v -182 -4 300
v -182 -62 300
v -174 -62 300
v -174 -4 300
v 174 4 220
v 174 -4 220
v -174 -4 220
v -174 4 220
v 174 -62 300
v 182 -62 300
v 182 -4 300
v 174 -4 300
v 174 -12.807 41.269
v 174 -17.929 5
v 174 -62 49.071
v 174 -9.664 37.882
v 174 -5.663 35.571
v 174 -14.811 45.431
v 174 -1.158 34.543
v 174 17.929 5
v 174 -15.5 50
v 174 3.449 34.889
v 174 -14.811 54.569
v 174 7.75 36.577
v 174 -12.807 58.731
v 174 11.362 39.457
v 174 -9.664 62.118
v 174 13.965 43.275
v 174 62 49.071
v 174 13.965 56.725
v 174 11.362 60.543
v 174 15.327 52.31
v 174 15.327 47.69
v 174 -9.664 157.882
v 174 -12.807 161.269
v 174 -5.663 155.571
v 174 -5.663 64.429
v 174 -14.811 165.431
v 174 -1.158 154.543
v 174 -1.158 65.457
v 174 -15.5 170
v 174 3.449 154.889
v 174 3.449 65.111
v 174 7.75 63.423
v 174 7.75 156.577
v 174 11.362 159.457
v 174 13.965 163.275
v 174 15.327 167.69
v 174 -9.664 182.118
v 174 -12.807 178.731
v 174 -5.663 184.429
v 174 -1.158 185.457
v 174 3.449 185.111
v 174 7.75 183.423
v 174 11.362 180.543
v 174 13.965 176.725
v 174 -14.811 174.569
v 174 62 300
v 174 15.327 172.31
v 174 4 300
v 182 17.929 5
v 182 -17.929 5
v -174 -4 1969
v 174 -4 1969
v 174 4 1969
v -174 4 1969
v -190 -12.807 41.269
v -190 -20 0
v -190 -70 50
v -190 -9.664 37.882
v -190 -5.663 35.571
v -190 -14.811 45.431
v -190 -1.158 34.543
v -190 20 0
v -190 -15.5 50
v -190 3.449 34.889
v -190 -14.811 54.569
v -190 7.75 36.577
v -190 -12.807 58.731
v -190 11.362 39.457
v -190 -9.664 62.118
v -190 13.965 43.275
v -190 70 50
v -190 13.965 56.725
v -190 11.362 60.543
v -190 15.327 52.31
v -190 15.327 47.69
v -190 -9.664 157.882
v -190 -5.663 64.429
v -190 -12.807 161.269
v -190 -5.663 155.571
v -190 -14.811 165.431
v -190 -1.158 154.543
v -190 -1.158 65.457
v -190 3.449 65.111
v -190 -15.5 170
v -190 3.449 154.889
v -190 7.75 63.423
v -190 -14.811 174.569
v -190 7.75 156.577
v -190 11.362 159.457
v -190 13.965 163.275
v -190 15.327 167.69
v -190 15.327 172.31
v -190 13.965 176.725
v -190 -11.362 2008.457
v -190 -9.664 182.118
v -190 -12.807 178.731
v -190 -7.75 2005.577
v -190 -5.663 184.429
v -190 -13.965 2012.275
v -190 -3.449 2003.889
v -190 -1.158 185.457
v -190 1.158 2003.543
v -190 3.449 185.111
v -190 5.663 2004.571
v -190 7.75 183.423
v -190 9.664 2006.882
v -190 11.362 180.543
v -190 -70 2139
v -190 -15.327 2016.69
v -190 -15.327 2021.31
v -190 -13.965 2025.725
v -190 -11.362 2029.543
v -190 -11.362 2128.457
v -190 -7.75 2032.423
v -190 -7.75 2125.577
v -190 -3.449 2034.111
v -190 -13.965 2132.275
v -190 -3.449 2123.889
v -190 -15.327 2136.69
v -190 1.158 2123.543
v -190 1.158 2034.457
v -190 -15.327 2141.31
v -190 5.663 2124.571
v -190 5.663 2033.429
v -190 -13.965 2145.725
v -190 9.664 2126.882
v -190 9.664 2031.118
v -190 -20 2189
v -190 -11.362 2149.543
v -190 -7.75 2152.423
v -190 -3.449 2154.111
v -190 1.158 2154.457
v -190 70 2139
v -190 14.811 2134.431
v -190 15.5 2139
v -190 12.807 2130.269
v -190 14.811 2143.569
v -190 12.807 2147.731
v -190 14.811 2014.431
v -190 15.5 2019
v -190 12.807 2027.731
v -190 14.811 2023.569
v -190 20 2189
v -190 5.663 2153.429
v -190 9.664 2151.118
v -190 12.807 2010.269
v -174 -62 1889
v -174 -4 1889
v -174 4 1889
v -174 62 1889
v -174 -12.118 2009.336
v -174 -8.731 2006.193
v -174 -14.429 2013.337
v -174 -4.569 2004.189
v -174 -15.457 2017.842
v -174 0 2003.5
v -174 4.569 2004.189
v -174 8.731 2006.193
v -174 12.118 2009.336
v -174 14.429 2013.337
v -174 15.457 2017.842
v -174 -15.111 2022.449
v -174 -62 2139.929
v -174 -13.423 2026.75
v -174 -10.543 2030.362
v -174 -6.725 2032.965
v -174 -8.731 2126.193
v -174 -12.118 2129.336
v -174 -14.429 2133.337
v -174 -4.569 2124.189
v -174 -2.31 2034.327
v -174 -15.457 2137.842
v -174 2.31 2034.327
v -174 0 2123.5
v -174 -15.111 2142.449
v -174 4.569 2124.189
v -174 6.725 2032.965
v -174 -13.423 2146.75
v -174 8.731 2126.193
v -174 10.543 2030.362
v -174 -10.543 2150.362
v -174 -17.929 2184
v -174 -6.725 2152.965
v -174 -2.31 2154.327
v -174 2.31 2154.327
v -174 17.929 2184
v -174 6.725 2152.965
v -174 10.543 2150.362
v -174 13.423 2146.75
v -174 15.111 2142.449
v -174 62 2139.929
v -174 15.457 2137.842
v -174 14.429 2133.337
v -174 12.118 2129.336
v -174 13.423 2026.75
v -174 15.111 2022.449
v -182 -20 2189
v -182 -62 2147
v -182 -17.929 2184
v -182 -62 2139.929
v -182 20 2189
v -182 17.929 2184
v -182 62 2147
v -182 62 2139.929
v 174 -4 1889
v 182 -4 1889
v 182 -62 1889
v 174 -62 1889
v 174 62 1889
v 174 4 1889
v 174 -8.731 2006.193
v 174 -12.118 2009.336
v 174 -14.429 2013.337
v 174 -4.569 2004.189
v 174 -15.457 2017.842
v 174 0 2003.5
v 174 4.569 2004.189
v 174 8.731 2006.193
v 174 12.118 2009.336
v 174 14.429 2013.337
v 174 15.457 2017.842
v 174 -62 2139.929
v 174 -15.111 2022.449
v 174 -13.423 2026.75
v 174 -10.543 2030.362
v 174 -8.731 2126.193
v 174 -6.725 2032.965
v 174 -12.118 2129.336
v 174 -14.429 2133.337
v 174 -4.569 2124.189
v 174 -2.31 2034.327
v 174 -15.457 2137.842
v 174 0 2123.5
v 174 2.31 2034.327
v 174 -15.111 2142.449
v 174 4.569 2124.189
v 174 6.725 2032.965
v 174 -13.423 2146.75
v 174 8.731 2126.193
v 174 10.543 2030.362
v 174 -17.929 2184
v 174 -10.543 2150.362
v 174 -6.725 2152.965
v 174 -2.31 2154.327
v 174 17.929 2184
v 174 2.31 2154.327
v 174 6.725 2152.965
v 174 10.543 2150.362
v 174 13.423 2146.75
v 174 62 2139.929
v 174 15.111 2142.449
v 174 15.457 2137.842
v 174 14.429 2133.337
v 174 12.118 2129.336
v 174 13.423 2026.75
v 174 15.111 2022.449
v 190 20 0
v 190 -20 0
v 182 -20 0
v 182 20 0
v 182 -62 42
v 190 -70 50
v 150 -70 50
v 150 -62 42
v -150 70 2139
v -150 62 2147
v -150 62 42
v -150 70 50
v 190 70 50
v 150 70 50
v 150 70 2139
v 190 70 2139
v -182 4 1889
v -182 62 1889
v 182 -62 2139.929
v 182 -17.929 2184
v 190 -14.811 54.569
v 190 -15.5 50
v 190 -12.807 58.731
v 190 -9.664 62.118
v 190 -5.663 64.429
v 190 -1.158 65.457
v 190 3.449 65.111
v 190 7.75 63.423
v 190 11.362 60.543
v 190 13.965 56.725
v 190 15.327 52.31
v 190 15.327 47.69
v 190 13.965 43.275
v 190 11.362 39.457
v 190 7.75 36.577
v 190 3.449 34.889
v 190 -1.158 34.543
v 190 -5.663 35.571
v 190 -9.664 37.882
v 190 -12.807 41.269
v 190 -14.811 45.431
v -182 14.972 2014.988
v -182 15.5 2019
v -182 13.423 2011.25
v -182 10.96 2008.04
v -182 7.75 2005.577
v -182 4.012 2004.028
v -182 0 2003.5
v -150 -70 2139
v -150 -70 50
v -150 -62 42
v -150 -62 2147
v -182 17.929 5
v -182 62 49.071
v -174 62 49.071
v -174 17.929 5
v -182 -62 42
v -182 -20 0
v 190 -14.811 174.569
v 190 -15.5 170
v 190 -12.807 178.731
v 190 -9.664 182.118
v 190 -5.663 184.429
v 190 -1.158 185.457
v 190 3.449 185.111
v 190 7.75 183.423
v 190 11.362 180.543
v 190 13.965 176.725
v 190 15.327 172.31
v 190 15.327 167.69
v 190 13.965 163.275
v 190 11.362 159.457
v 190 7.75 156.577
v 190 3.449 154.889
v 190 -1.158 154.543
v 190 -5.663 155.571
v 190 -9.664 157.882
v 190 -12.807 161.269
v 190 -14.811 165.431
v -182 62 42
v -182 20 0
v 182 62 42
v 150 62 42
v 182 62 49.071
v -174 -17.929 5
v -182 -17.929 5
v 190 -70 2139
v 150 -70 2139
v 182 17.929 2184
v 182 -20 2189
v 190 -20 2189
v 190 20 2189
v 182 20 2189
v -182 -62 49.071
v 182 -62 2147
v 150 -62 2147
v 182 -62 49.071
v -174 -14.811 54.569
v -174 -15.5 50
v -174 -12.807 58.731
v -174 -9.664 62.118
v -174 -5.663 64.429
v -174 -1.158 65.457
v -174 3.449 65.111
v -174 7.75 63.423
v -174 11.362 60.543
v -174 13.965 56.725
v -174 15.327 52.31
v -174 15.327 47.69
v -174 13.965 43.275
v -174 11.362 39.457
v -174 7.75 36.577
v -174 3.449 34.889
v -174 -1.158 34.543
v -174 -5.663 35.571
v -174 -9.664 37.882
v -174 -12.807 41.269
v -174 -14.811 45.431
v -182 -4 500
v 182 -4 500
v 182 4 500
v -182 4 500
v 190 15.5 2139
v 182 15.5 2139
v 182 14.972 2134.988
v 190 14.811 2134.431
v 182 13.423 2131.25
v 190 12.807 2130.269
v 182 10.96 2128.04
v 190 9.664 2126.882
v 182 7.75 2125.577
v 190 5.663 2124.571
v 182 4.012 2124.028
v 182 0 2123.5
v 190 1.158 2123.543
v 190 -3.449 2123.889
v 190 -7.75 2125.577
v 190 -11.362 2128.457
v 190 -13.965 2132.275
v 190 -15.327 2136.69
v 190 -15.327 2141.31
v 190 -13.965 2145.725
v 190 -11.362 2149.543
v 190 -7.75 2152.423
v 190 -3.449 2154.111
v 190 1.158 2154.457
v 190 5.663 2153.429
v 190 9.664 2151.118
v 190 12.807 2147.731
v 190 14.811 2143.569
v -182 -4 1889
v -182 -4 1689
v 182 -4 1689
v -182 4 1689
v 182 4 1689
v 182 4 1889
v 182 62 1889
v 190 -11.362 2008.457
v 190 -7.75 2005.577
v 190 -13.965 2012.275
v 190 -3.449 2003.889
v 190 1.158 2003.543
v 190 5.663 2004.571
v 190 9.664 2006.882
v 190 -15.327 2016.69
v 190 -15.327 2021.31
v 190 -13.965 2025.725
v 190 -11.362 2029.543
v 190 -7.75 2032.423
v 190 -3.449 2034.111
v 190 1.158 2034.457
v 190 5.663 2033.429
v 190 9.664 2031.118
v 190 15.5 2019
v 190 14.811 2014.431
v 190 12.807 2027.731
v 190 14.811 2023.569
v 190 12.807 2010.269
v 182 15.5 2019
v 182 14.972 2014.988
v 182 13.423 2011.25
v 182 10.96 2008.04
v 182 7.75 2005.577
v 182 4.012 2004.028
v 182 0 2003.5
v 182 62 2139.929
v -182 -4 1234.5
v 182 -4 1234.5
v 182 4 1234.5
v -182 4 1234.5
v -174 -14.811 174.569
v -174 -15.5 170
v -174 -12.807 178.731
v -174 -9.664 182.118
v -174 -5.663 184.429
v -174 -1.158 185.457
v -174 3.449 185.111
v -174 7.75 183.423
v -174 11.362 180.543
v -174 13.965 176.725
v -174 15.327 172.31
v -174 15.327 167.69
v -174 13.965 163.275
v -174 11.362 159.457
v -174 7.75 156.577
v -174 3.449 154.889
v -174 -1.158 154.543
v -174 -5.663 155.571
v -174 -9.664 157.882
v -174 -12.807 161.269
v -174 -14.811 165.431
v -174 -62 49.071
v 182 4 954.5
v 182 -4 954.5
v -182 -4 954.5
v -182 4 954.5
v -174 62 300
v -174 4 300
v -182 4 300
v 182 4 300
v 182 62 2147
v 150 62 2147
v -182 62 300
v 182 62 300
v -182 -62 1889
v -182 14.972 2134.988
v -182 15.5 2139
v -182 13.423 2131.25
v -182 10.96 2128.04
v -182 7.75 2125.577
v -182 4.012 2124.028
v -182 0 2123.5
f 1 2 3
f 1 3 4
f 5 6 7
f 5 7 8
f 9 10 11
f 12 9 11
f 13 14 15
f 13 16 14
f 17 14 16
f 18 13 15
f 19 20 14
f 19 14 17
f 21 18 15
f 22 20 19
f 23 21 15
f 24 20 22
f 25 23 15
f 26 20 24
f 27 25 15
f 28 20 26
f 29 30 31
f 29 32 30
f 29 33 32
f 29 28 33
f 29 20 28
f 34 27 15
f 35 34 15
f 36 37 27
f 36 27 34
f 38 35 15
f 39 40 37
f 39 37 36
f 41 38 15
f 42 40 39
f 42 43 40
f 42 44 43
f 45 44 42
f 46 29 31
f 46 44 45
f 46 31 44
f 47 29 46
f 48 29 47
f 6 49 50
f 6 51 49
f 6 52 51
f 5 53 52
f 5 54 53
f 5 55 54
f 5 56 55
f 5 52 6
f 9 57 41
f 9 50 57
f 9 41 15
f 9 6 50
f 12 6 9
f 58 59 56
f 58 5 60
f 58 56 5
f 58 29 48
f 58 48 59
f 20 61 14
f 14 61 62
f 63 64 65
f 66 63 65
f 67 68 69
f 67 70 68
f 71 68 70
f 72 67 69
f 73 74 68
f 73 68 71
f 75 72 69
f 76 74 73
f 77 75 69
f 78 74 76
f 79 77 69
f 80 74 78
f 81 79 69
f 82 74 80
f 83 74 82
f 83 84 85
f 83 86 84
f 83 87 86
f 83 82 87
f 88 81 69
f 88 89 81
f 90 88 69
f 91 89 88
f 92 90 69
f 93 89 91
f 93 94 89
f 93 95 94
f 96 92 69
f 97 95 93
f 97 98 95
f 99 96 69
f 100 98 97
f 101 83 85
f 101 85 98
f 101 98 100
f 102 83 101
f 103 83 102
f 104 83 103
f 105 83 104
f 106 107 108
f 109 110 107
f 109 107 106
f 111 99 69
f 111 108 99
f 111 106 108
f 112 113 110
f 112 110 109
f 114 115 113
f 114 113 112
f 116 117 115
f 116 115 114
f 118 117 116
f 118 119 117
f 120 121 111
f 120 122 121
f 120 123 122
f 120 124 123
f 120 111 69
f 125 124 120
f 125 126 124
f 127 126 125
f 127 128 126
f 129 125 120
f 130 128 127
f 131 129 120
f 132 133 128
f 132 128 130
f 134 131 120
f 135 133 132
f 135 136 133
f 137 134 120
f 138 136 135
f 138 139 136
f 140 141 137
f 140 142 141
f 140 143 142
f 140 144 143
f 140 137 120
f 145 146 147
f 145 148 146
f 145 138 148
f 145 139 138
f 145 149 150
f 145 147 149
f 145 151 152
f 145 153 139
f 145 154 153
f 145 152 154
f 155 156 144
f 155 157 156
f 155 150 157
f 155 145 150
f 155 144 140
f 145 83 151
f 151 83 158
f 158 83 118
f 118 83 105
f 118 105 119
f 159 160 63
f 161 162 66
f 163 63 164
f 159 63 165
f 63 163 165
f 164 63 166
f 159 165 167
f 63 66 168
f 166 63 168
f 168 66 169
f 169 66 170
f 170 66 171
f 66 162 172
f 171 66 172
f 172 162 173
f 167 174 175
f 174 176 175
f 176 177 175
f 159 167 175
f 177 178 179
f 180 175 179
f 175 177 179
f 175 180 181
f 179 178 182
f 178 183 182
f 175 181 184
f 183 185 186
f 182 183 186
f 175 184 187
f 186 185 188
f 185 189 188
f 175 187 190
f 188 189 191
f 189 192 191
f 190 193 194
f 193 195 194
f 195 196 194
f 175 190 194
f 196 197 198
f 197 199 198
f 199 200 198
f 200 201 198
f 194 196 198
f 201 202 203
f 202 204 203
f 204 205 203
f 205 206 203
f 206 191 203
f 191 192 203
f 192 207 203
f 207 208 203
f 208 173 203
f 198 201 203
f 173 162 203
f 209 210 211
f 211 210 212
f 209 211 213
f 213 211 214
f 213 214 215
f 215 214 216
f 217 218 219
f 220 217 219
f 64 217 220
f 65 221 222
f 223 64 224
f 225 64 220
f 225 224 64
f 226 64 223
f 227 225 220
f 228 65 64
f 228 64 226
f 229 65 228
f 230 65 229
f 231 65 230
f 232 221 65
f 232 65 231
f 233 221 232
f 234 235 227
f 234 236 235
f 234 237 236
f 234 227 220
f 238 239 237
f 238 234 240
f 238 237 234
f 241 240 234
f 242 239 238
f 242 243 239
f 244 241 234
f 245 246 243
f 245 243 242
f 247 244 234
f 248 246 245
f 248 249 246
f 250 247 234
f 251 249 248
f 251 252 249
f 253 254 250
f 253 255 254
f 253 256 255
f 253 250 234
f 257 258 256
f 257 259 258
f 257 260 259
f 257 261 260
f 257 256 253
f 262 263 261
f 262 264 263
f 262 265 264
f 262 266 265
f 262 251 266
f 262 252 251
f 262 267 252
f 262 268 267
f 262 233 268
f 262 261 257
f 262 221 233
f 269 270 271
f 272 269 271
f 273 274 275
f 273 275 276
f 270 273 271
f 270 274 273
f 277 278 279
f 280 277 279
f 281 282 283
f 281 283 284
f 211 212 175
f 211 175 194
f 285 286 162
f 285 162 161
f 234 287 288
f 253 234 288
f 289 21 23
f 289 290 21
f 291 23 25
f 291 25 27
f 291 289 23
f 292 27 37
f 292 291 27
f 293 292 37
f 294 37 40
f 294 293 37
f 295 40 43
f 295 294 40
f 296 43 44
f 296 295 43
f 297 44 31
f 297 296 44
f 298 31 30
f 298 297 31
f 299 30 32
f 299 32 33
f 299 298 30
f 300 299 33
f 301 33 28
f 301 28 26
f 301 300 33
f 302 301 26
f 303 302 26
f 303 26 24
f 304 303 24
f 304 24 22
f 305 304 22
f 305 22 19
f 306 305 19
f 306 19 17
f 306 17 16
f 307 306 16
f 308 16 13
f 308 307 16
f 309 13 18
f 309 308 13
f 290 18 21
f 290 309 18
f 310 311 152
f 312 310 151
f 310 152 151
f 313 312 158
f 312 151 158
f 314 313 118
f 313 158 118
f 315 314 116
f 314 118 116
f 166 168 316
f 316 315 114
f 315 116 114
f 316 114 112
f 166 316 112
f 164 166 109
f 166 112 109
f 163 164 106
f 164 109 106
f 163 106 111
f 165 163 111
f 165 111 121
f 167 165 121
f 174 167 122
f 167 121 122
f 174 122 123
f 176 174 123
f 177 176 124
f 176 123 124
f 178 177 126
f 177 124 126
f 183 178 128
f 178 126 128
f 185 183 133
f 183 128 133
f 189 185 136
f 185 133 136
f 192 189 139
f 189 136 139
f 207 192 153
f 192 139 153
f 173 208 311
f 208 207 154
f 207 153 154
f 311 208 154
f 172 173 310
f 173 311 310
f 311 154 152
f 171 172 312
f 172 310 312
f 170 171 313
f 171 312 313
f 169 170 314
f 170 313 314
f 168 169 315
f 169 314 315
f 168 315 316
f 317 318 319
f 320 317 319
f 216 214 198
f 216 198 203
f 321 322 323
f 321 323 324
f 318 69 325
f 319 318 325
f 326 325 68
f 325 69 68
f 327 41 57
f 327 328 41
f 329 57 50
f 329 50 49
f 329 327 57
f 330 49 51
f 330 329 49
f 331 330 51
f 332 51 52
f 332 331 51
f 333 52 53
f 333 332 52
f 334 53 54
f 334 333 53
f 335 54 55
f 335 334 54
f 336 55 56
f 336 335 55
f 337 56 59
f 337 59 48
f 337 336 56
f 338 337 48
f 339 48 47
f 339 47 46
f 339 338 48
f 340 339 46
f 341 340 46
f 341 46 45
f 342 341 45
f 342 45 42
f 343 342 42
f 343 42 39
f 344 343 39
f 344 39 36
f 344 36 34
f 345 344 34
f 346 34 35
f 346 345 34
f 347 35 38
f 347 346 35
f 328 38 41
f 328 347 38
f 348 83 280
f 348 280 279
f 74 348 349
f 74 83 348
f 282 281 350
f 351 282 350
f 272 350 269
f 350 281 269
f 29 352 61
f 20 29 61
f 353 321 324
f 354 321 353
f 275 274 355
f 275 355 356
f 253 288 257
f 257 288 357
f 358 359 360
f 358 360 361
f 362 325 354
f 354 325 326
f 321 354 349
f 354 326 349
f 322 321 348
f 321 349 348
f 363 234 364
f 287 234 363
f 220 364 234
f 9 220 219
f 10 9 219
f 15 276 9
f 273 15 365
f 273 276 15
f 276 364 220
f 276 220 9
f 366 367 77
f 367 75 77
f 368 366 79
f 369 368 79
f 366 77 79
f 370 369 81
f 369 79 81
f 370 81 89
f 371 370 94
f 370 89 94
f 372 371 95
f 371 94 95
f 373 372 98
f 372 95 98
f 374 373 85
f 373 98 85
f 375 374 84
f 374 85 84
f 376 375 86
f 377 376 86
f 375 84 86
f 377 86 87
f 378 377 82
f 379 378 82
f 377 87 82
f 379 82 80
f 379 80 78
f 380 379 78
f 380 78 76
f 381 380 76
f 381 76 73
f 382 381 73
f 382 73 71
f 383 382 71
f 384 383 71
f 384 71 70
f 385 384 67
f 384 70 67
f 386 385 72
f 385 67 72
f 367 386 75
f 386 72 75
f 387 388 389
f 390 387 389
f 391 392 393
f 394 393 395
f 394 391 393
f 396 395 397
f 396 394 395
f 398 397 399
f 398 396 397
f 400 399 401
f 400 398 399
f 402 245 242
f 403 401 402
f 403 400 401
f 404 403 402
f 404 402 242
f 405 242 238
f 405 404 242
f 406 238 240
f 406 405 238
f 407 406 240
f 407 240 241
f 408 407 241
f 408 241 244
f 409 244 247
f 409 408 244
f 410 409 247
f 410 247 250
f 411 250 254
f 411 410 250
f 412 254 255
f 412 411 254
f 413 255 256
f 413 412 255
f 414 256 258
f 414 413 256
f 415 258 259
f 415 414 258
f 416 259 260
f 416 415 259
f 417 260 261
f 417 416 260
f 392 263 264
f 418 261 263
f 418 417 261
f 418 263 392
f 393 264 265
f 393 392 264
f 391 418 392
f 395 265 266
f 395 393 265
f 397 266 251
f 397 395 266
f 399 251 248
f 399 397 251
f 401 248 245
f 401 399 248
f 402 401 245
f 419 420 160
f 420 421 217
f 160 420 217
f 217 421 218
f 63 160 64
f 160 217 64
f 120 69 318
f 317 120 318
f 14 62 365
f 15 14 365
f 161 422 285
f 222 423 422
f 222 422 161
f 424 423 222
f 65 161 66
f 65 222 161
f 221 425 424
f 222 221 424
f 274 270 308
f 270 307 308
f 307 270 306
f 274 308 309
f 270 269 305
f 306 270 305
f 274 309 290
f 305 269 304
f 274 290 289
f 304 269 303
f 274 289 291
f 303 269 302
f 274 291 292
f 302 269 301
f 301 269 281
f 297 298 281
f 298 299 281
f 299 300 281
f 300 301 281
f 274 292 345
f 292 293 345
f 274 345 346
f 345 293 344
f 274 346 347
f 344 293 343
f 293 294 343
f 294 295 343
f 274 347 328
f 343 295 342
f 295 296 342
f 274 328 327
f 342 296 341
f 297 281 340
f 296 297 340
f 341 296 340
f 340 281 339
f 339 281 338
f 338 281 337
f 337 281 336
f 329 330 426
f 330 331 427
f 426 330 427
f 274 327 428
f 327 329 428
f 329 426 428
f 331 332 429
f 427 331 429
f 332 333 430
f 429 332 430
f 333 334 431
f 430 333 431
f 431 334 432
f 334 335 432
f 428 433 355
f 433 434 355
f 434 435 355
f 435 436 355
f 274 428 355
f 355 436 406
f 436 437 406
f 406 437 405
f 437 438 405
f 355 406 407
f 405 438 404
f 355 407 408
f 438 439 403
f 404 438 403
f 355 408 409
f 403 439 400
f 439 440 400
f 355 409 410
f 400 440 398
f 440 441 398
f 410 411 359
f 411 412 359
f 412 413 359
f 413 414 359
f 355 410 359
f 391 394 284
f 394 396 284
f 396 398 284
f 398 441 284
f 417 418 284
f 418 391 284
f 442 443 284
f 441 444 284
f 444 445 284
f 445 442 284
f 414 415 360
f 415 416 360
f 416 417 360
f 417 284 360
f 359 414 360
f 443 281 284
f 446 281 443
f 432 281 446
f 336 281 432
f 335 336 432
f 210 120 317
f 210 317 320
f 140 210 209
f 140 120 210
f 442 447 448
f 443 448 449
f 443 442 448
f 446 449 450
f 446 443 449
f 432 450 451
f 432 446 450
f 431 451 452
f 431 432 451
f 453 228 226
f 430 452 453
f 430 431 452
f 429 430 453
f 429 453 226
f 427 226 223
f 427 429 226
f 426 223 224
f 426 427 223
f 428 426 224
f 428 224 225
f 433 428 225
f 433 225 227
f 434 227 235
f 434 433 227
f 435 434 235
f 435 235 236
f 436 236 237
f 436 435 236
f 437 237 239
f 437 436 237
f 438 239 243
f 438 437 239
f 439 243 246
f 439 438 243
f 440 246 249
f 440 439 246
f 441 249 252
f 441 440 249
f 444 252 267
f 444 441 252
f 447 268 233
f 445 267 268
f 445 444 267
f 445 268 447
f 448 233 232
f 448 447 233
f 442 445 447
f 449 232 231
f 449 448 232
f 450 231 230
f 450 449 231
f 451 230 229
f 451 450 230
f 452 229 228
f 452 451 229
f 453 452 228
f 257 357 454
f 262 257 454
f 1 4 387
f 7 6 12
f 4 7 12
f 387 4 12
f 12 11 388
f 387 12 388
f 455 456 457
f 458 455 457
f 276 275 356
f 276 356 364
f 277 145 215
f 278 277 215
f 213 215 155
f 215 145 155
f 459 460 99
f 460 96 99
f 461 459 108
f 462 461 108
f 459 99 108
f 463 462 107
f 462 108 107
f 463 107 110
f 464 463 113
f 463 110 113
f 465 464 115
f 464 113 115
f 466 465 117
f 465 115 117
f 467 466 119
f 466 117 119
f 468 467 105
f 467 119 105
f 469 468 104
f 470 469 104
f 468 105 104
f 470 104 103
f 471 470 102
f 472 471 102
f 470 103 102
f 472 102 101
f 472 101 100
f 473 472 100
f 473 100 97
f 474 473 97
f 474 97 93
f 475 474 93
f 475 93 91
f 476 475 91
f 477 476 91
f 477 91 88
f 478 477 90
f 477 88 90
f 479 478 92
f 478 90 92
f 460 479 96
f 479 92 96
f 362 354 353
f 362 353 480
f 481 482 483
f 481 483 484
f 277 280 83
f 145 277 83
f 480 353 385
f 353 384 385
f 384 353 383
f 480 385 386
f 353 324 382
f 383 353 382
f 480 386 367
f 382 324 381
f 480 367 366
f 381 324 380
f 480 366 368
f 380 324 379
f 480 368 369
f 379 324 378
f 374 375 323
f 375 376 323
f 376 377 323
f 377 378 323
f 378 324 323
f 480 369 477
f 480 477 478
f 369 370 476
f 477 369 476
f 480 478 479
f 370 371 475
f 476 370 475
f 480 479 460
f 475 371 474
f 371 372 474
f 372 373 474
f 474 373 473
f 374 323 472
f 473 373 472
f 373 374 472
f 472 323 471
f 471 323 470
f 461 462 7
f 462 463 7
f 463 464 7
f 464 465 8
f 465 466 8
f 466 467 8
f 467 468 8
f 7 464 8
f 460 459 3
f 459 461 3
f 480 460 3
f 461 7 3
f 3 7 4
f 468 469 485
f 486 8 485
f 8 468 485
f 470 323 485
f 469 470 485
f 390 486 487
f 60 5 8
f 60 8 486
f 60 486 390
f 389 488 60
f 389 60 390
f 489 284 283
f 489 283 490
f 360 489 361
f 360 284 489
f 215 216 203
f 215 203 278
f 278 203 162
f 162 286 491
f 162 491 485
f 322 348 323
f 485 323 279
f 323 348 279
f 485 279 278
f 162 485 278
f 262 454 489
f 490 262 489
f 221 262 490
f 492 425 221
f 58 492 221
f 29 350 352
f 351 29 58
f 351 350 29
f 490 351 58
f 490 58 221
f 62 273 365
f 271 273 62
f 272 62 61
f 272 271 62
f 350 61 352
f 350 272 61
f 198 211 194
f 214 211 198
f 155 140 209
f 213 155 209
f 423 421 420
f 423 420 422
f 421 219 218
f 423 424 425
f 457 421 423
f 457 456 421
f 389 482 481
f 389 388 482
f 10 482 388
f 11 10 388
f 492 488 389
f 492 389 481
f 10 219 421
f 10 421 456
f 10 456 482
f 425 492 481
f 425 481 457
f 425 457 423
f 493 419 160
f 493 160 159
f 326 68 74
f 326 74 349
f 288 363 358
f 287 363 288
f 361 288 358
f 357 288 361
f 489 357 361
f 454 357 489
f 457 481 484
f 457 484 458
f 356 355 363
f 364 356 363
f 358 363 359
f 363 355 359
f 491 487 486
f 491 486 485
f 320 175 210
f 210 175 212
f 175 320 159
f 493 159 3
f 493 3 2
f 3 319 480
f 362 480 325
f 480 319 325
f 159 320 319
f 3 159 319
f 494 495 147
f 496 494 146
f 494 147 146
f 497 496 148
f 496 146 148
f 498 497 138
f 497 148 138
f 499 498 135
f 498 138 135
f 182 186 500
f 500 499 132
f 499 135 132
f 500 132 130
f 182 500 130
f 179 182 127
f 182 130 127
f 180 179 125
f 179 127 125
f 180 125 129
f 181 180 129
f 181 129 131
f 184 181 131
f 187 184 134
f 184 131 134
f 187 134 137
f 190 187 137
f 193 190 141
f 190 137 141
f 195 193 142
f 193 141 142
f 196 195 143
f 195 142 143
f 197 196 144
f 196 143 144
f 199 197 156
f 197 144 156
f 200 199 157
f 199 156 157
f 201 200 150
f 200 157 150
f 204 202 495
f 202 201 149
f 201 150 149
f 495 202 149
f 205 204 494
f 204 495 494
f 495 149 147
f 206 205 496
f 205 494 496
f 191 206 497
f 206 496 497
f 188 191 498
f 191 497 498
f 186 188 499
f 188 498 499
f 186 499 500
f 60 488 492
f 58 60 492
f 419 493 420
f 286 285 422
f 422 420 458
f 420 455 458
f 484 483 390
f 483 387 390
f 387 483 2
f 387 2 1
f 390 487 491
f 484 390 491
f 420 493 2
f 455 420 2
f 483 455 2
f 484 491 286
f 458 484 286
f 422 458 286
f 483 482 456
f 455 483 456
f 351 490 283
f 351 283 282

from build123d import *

# Parameters (mm, degrees)
EXTRUDE_1_DEPTH     = 2189
SKETCH_2_R          = 15.5
CUT_EXTRUDE_3_DEPTH = 2191.48419305
EXTRUDE_4_DEPTH     = 8
SKETCH_2_6_R        = 15.5
CUT_EXTRUDE_5_DEPTH = 2191.48419305
SKETCH_2_7_W        = 280
SKETCH_2_7_H        = 8
EXTRUDE_6_DEPTH     = 190


with BuildPart() as part:
    # 草图1 → 拉伸1 (new body)
    with BuildSketch(Plane.XY):
        Polygon((-150, 70), (-190, 70), (-190, -70), (-150, -70), (-150, -62), (-182, -62), (-182, 62), (-150, 62), align=None)
    extrude(amount=EXTRUDE_1_DEPTH)

    # 草图2 → 拉伸3 (cut, through all)
    with BuildSketch(Plane.ZY.offset(190)):
        with Locations((50, 0)):
            Circle(SKETCH_2_R)
        with Locations((170, 0)):
            Circle(SKETCH_2_R)
        with Locations((2019, 0)):
            Circle(SKETCH_2_R)
        with Locations((2139, 0)):
            Circle(SKETCH_2_R)
        Polygon((50, 70), (0, 20), (0, 70), align=None)
        Polygon((50, -70), (0, -20), (0, -70), align=None)
        Polygon((2189, -70), (2139, -70), (2189, -20), align=None)
        Polygon((2189, 70), (2139, 70), (2189, 20), align=None)
    extrude(amount=-CUT_EXTRUDE_3_DEPTH, mode=Mode.SUBTRACT)

    # 草图3 → 拉伸4 (add)
    with BuildSketch(Plane(origin=(-182, 0, 0), x_dir=(0, 0, -1), z_dir=(1, 0, 0))):
        Polygon((-2184, -17.928932188), (-2184, 17.928932188), (-2139.928932188, 62), (-1889, 62), (-1889, -62), (-2139.928932188, -62), align=None)
        Polygon((-5, -17.928932188), (-49.071067812, -62), (-300, -62), (-300, 62), (-49.071067812, 62), (-5, 17.928932188), align=None)
    extrude(amount=EXTRUDE_4_DEPTH)

    # 草图2<6> → 拉伸5 (cut, through all)
    with BuildSketch(Plane.ZY.offset(190)):
        with Locations((50, 0)):
            Circle(SKETCH_2_6_R)
        with Locations((170, 0)):
            Circle(SKETCH_2_6_R)
        with Locations((2019, 0)):
            Circle(SKETCH_2_6_R)
        with Locations((2139, 0)):
            Circle(SKETCH_2_6_R)
    extrude(amount=-CUT_EXTRUDE_5_DEPTH, mode=Mode.SUBTRACT)

    # 草图2<7> → 拉伸6 (add)
    with BuildSketch(Plane.ZY.offset(190)):
        with Locations((1094.5, 0)):
            Rectangle(SKETCH_2_7_W, SKETCH_2_7_H)
        with Locations((360, 0)):
            Rectangle(SKETCH_2_7_W, SKETCH_2_7_H)
        with Locations((1829, 0)):
            Rectangle(SKETCH_2_7_W, SKETCH_2_7_H)
    extrude(amount=-EXTRUDE_6_DEPTH)

    # 镜向1: part across plane


with BuildPart() as part_1:
    add(part.part)
    add(part.part.mirror(Plane(origin=(0, -4, 1689), x_dir=(0, 0, 1), z_dir=(-1, 0, 0))))


solid = part_1.part
